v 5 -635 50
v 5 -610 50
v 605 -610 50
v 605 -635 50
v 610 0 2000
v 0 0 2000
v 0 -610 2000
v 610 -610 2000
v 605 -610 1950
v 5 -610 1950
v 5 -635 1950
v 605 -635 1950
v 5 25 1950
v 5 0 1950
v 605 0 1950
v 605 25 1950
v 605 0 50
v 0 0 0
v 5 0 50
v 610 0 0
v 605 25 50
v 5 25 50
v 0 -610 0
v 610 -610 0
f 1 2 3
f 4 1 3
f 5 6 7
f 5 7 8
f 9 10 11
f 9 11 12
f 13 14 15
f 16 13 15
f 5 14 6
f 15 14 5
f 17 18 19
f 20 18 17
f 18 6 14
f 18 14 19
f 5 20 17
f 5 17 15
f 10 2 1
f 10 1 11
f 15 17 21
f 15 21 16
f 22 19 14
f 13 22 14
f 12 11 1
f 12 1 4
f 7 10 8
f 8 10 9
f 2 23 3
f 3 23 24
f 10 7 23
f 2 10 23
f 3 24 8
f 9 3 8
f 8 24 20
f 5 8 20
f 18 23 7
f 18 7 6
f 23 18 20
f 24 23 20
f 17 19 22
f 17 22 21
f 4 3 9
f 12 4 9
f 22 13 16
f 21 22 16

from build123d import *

# Parameters (mm, degrees)
F0_W     = 610
F0_H     = 610
F1_DEPTH = 2000
F2_W     = 600
F2_H     = 1900
F3_DEPTH = 25


with BuildPart() as f1:
    # F0 (on Top) → F1 (new body)
    with BuildSketch(Plane.XY):
        with Locations((305, -305)):
            Rectangle(F0_W, F0_H)
    extrude(amount=F1_DEPTH)

    # F2 (on face) → F3 (join)
    with BuildSketch(Plane.XZ.offset(610)):
        with Locations((305, 1000)):
            Rectangle(F2_W, F2_H)
    extrude(amount=F3_DEPTH)

    # F8: F1 across plane


with BuildPart() as f1_1:
    add(f1.part)
    add(f1.part.mirror(Plane(origin=(0, -305, 2000), x_dir=(1, 0, 0), z_dir=(0, -1, 0))))


solid = f1_1.part
